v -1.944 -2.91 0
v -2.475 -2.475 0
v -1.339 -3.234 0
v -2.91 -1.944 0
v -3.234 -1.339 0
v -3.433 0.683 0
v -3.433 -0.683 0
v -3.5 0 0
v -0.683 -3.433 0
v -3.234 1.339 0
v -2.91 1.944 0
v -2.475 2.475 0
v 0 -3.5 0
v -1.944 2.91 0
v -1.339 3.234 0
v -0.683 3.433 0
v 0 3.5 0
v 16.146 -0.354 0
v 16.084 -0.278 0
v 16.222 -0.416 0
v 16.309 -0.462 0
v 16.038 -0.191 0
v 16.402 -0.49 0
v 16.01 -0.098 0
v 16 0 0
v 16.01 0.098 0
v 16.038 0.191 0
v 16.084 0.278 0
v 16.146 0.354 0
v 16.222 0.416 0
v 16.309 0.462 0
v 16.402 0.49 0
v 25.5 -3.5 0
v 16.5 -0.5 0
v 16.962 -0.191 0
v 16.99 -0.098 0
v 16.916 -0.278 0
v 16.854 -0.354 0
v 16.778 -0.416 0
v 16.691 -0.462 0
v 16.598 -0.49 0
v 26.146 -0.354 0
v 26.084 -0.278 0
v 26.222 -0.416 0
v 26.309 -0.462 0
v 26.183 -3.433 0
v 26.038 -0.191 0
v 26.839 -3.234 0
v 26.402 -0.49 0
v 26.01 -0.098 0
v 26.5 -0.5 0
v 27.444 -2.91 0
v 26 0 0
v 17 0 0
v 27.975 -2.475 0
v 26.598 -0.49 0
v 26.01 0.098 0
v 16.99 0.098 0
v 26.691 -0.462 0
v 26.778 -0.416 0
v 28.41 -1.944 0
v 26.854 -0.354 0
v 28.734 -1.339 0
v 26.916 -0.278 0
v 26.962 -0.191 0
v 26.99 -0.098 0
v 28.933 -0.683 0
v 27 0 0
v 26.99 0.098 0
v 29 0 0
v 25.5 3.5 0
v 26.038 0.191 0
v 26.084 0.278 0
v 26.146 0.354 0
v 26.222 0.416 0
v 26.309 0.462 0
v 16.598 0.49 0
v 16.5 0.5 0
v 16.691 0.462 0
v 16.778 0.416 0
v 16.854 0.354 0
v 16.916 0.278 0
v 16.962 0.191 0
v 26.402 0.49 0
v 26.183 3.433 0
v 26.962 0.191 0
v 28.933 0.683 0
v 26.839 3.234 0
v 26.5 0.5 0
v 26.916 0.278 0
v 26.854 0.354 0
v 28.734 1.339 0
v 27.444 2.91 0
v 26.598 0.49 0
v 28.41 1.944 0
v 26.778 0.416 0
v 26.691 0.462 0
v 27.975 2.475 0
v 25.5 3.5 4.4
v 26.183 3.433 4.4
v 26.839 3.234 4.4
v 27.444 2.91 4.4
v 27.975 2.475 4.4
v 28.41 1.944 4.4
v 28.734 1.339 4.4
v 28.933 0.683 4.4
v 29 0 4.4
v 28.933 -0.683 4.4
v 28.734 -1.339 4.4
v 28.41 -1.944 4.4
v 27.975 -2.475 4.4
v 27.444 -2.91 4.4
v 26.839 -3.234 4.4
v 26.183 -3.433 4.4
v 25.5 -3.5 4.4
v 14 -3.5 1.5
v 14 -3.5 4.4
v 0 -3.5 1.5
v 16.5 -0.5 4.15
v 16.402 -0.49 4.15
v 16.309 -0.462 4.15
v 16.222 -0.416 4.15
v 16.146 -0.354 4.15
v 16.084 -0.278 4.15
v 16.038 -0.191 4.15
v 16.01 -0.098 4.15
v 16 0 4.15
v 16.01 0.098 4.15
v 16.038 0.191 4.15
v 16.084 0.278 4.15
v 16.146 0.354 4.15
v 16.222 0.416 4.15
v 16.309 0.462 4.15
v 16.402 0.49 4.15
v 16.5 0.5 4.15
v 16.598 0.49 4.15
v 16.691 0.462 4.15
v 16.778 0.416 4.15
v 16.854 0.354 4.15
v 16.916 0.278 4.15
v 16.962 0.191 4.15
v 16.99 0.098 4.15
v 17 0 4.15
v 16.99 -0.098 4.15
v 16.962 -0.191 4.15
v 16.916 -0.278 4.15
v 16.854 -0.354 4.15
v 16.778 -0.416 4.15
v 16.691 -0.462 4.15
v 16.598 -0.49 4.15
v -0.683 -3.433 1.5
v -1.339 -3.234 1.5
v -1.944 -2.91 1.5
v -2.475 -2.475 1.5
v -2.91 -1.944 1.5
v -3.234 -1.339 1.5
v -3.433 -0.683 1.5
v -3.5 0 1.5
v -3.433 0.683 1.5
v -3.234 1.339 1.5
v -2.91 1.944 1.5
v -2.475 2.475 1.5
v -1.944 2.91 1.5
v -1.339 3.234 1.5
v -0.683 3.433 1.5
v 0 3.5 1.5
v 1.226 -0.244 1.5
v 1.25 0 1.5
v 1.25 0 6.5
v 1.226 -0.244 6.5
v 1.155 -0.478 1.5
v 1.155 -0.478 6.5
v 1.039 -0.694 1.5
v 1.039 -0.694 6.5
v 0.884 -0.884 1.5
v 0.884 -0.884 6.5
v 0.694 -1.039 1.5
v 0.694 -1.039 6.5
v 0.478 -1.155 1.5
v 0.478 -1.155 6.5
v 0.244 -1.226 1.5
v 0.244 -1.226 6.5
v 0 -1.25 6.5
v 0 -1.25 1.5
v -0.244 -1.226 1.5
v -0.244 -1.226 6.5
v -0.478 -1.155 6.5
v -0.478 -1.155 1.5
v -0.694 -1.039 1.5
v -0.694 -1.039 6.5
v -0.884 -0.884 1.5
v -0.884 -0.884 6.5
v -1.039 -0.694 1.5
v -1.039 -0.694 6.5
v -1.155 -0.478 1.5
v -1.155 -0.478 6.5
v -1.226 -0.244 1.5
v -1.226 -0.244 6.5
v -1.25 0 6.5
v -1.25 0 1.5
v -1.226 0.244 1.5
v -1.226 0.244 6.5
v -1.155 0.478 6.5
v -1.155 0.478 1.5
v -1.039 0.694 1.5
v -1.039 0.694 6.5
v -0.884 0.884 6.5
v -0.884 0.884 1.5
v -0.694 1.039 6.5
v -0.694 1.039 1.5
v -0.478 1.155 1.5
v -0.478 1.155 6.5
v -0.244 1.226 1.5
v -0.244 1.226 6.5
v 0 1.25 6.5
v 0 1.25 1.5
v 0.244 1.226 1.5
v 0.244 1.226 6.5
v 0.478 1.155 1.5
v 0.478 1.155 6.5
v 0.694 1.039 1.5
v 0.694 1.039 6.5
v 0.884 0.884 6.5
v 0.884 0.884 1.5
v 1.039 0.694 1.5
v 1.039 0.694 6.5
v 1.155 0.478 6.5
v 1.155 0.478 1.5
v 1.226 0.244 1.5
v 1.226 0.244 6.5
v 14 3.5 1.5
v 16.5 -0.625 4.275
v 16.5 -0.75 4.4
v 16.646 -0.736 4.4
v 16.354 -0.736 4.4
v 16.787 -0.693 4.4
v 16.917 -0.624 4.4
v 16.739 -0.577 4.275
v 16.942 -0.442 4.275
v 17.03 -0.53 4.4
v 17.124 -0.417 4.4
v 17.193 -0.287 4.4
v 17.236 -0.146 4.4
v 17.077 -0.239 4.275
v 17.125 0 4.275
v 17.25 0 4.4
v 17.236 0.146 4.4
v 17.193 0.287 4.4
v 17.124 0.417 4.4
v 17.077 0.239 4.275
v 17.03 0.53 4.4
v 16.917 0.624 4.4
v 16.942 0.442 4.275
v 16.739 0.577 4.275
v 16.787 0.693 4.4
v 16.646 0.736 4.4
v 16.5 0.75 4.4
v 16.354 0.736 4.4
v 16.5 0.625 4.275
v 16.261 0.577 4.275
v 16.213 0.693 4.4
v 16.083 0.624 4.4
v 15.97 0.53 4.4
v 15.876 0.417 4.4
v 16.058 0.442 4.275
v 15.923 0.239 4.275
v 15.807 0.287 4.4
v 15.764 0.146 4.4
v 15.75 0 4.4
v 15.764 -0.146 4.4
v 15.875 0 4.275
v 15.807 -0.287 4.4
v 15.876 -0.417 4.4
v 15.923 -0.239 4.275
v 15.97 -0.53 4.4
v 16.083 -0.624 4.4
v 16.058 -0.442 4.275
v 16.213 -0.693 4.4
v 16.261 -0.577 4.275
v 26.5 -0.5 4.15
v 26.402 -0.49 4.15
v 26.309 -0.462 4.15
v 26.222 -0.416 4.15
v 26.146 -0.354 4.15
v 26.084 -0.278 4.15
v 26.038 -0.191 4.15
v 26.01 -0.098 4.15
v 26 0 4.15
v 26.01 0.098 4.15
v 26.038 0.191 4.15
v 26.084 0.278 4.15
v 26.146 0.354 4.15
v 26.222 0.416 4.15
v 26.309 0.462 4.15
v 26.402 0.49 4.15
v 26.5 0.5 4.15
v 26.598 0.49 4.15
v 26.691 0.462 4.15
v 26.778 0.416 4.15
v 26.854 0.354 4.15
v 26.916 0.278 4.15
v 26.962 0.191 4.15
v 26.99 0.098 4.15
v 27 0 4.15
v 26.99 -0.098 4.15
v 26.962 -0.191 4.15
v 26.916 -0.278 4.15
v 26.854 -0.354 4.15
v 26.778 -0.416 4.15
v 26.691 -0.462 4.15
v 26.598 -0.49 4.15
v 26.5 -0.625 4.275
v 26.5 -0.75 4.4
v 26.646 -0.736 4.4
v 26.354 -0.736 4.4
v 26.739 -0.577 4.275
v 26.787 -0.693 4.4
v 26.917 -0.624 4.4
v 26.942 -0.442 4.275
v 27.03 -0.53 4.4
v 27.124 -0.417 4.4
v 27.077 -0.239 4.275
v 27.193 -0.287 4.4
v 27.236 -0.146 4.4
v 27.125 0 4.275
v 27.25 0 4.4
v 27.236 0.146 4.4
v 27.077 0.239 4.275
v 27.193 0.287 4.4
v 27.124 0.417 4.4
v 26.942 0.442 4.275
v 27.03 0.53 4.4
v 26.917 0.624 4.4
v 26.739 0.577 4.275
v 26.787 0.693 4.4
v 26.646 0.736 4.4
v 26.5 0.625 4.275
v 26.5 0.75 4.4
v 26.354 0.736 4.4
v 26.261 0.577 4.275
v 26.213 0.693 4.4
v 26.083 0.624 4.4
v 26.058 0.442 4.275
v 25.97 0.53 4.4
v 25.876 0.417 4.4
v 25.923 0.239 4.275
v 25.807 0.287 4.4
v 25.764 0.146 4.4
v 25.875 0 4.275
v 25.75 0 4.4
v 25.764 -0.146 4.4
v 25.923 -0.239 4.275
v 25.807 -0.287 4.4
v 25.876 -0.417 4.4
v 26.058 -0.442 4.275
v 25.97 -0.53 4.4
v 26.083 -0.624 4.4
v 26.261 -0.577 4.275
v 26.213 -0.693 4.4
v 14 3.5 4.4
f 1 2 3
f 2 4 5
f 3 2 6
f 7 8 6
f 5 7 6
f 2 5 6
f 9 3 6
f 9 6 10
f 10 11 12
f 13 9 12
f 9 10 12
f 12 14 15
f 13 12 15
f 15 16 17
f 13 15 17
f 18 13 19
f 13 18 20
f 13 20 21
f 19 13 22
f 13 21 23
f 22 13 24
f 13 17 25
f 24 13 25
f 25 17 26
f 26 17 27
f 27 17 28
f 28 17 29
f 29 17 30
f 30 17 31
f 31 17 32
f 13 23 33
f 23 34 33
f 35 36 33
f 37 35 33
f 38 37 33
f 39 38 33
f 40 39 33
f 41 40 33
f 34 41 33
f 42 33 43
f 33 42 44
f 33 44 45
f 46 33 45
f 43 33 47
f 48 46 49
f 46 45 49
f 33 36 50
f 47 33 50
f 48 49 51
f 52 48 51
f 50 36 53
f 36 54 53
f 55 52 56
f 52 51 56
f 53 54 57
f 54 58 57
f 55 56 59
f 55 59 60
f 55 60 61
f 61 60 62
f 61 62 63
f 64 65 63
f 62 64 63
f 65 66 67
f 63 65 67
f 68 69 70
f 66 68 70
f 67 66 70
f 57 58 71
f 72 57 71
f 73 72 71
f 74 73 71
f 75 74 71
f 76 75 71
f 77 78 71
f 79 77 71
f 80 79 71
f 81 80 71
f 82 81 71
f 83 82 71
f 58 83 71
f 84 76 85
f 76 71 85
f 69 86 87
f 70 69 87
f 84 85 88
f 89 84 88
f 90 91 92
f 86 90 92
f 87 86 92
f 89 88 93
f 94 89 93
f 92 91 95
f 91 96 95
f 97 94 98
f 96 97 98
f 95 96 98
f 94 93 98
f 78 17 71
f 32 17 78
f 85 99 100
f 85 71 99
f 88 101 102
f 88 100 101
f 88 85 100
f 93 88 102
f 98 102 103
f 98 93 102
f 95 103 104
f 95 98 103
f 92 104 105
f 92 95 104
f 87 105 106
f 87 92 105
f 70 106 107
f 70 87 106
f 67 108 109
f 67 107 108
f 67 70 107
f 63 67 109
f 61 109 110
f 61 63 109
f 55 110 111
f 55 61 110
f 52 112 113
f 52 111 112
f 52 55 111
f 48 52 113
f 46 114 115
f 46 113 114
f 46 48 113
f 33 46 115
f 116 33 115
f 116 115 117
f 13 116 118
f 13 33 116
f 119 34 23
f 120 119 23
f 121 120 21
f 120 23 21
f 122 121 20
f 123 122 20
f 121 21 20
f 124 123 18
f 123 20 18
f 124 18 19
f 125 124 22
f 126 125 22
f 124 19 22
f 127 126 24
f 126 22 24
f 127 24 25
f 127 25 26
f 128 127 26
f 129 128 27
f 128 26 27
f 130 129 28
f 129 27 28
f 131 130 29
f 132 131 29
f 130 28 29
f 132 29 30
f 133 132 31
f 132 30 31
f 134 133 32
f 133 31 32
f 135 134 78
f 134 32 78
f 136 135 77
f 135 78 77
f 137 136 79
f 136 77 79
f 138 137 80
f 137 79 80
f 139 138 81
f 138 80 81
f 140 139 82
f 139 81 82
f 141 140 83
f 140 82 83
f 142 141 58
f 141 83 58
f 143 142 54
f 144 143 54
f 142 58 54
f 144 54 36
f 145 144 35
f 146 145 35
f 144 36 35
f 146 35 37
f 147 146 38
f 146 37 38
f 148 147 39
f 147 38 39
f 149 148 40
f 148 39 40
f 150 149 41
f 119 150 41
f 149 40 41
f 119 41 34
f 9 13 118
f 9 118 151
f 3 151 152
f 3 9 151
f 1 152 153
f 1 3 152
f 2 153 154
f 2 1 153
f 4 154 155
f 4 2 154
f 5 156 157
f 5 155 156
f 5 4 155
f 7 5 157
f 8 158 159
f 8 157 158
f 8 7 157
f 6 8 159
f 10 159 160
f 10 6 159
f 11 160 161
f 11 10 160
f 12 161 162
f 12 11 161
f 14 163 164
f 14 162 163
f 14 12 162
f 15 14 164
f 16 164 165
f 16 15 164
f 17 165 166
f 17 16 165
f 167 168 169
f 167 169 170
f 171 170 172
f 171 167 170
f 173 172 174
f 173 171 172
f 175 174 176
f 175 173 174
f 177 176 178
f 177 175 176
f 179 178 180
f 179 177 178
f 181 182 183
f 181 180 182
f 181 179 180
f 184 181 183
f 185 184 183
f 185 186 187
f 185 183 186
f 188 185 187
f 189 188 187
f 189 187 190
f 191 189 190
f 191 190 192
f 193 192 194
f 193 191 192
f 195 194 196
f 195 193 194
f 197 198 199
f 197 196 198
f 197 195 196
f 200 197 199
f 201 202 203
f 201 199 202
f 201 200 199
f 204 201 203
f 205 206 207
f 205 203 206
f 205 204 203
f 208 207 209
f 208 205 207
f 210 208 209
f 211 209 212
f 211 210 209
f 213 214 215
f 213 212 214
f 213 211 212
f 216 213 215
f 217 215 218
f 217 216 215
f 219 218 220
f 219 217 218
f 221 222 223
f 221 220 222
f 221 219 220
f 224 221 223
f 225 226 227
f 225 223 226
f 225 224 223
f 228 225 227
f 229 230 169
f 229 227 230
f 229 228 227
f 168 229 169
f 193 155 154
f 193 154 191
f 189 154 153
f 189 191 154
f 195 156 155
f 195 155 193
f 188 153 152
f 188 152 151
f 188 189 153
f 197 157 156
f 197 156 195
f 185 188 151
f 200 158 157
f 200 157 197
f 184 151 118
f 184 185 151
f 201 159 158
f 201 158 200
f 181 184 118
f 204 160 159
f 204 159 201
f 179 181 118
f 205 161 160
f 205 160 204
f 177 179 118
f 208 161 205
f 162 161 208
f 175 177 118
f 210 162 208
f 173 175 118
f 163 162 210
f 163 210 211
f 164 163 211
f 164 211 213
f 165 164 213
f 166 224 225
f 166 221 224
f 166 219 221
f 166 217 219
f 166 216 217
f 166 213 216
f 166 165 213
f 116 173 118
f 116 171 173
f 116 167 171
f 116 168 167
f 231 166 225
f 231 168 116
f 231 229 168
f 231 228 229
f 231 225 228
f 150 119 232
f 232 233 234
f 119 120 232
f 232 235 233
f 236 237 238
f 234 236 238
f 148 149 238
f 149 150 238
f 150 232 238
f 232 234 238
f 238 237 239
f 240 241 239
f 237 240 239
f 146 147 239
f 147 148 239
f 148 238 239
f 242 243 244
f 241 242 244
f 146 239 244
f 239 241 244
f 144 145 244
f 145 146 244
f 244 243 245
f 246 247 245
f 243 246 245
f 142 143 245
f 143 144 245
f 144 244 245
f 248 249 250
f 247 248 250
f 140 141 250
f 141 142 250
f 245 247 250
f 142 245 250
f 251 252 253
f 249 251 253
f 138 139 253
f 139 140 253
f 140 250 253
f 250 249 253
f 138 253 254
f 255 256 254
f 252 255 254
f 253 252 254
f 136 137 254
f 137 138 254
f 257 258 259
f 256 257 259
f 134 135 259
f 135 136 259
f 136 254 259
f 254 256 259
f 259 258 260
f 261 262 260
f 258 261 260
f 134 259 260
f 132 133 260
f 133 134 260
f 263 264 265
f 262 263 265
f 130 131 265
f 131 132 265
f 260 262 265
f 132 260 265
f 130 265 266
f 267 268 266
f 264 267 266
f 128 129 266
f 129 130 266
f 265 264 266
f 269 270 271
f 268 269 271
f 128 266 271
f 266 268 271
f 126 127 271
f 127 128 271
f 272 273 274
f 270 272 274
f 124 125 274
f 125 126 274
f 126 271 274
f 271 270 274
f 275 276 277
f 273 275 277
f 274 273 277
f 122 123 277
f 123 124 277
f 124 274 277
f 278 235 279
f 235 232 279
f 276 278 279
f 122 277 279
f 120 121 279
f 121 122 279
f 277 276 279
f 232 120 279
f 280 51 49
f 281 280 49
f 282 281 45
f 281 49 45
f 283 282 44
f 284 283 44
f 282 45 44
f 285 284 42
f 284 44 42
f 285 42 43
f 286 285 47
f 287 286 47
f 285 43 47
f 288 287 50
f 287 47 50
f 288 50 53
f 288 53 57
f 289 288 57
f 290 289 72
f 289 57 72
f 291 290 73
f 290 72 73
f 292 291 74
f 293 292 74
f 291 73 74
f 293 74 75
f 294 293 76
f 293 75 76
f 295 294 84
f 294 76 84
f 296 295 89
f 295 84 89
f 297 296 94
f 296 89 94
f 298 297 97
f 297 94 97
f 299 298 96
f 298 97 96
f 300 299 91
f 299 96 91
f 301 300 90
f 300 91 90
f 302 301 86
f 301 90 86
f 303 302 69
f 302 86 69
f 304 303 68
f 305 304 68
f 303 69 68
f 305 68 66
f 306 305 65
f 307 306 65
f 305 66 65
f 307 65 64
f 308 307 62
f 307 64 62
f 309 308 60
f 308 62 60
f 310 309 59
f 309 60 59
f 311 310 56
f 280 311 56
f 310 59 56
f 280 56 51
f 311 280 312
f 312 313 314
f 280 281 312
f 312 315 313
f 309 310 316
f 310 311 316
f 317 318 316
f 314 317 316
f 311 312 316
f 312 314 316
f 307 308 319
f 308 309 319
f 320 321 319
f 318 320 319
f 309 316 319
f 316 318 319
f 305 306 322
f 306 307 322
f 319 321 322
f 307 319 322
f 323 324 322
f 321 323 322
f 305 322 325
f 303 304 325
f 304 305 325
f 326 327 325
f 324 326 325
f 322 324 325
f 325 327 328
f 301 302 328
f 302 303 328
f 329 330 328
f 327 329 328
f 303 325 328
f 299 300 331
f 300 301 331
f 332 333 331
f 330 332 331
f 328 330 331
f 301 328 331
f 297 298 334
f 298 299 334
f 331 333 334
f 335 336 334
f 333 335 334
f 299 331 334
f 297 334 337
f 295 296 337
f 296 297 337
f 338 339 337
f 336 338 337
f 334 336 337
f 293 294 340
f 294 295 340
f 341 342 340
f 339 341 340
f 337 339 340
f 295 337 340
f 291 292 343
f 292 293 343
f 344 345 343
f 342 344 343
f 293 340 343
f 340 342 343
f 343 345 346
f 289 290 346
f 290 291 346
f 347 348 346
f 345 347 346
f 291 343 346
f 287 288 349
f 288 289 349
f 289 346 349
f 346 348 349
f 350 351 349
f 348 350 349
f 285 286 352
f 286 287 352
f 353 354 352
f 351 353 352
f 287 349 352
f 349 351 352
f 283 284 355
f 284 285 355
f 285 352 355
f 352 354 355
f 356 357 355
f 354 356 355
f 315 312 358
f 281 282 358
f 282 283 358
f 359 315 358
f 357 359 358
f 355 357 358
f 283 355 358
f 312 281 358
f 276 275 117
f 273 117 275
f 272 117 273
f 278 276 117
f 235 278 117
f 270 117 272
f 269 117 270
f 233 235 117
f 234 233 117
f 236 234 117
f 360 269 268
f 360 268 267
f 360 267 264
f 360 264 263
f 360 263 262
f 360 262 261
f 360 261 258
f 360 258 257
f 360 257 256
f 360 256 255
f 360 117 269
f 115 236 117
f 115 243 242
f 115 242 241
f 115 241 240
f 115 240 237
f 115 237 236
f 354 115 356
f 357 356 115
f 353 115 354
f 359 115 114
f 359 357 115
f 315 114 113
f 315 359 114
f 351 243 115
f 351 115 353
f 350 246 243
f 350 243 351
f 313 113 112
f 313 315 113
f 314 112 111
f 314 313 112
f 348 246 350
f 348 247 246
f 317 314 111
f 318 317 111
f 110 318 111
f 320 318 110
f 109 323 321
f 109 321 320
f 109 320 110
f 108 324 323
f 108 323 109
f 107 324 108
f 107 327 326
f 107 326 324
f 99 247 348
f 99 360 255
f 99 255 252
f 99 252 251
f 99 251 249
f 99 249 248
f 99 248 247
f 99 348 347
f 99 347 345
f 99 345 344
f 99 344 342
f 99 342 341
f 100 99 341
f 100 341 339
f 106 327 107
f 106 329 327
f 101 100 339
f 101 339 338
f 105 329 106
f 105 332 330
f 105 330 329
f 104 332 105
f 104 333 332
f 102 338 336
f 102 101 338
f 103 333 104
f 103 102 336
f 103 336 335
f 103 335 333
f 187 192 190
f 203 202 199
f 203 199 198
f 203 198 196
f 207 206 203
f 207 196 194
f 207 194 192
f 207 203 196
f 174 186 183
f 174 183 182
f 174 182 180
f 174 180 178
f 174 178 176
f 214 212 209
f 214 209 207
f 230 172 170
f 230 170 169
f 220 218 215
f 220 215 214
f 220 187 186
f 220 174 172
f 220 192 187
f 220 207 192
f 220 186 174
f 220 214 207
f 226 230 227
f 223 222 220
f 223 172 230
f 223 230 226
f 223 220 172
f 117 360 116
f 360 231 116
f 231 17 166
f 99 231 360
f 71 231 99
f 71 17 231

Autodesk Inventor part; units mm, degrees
ref_plane "YZ Plane" through (0, 0, 0) normal (1, 0, 0) x (0, 1, 0)
ref_plane "XZ Plane" through (0, 0, 0) normal (0, 1, 0) x (-1, 0, 0)
ref_plane "XY Plane" through (0, 0, 0) normal (0, 0, 1) x (1, 0, 0)
sketch "Эскиз1" plane through (0, 0, 0) normal (0, 0, 1) x (1, 0, 0)
  line L0 (0, 0) -> (25.5, 0) construction
  line L1 (0, -3.5) -> (25.5, -3.5)
  line L2 (25.5, 3.5) -> (0, 3.5)
  arc A0 (0, 3.5) -> (0, -3.5) centre (0, 0) ccw
  arc A1 (25.5, -3.5) -> (25.5, 3.5) centre (25.5, 0) ccw
  point P0 (12.75, 0)
  dimension "d3" = 25.5
  dimension "d4" = 7
extrude "Выдавливание1" add sketch "Эскиз1" along normal blind 1.5
sketch "Эскиз2" plane through (0, 0, 1.5) normal (0, 0, 1) x (1, 0, 0)
  circle A0 centre (0, 0) radius 1.25
  dimension "d7" = 2.5
extrude "Выдавливание2" add sketch "Эскиз2" along normal blind 5
sketch "Эскиз4" plane through (0, 0, 1.5) normal (0, 0, 1) x (1, 0, 0)
  line L0 (0, -3.5) -> (25.5, -3.5) construction
  arc A0 (0, 3.5) -> (0, -3.5) centre (0, 0) ccw construction
  line L1 (25.5, 3.5) -> (0, 3.5) construction
  arc A1 (25.5, -3.5) -> (25.5, 3.5) centre (25.5, 0) ccw construction
  line L2 (25.5, -3.5) -> (14, -3.5)
  line L3 (14, 3.5) -> (25.5, 3.5)
  arc A2 (25.5, -3.5) -> (25.5, 3.5) centre (25.5, 0) ccw
  line L4 (14, 3.5) -> (14, -3.5)
  dimension "d15" = 11.5
extrude "Выдавливание4" add sketch "Эскиз4" along normal blind 2.9
sketch "Эскиз5" plane through (0, 0, 4.4) normal (0, 0, 1) x (1, 0, 0)
  circle A0 centre (26.5, 0) radius 0.5
  circle A1 centre (16.5, 0) radius 0.5
  line L0 (16.5, 0) -> (21.5, 0) construction
  line L1 (21.5, 0) -> (26.5, 0) construction
  arc A2 (25.5, -3.5) -> (25.5, 3.5) centre (25.5, 0) ccw construction
  point P0 (0, 0)
  point P1 (29, 0)
  dimension "d18" = 1
  dimension "d25" = 10
  dimension "d26" = 2.5
hole "Отверстие1" at (16.5, 0, 4.4) at (26.5, 0, 4.4) direction (0, 0, -1) diameter 1 end through all countersink diameter 1.5 countersink angle 90
properties part number "элемент-1"
